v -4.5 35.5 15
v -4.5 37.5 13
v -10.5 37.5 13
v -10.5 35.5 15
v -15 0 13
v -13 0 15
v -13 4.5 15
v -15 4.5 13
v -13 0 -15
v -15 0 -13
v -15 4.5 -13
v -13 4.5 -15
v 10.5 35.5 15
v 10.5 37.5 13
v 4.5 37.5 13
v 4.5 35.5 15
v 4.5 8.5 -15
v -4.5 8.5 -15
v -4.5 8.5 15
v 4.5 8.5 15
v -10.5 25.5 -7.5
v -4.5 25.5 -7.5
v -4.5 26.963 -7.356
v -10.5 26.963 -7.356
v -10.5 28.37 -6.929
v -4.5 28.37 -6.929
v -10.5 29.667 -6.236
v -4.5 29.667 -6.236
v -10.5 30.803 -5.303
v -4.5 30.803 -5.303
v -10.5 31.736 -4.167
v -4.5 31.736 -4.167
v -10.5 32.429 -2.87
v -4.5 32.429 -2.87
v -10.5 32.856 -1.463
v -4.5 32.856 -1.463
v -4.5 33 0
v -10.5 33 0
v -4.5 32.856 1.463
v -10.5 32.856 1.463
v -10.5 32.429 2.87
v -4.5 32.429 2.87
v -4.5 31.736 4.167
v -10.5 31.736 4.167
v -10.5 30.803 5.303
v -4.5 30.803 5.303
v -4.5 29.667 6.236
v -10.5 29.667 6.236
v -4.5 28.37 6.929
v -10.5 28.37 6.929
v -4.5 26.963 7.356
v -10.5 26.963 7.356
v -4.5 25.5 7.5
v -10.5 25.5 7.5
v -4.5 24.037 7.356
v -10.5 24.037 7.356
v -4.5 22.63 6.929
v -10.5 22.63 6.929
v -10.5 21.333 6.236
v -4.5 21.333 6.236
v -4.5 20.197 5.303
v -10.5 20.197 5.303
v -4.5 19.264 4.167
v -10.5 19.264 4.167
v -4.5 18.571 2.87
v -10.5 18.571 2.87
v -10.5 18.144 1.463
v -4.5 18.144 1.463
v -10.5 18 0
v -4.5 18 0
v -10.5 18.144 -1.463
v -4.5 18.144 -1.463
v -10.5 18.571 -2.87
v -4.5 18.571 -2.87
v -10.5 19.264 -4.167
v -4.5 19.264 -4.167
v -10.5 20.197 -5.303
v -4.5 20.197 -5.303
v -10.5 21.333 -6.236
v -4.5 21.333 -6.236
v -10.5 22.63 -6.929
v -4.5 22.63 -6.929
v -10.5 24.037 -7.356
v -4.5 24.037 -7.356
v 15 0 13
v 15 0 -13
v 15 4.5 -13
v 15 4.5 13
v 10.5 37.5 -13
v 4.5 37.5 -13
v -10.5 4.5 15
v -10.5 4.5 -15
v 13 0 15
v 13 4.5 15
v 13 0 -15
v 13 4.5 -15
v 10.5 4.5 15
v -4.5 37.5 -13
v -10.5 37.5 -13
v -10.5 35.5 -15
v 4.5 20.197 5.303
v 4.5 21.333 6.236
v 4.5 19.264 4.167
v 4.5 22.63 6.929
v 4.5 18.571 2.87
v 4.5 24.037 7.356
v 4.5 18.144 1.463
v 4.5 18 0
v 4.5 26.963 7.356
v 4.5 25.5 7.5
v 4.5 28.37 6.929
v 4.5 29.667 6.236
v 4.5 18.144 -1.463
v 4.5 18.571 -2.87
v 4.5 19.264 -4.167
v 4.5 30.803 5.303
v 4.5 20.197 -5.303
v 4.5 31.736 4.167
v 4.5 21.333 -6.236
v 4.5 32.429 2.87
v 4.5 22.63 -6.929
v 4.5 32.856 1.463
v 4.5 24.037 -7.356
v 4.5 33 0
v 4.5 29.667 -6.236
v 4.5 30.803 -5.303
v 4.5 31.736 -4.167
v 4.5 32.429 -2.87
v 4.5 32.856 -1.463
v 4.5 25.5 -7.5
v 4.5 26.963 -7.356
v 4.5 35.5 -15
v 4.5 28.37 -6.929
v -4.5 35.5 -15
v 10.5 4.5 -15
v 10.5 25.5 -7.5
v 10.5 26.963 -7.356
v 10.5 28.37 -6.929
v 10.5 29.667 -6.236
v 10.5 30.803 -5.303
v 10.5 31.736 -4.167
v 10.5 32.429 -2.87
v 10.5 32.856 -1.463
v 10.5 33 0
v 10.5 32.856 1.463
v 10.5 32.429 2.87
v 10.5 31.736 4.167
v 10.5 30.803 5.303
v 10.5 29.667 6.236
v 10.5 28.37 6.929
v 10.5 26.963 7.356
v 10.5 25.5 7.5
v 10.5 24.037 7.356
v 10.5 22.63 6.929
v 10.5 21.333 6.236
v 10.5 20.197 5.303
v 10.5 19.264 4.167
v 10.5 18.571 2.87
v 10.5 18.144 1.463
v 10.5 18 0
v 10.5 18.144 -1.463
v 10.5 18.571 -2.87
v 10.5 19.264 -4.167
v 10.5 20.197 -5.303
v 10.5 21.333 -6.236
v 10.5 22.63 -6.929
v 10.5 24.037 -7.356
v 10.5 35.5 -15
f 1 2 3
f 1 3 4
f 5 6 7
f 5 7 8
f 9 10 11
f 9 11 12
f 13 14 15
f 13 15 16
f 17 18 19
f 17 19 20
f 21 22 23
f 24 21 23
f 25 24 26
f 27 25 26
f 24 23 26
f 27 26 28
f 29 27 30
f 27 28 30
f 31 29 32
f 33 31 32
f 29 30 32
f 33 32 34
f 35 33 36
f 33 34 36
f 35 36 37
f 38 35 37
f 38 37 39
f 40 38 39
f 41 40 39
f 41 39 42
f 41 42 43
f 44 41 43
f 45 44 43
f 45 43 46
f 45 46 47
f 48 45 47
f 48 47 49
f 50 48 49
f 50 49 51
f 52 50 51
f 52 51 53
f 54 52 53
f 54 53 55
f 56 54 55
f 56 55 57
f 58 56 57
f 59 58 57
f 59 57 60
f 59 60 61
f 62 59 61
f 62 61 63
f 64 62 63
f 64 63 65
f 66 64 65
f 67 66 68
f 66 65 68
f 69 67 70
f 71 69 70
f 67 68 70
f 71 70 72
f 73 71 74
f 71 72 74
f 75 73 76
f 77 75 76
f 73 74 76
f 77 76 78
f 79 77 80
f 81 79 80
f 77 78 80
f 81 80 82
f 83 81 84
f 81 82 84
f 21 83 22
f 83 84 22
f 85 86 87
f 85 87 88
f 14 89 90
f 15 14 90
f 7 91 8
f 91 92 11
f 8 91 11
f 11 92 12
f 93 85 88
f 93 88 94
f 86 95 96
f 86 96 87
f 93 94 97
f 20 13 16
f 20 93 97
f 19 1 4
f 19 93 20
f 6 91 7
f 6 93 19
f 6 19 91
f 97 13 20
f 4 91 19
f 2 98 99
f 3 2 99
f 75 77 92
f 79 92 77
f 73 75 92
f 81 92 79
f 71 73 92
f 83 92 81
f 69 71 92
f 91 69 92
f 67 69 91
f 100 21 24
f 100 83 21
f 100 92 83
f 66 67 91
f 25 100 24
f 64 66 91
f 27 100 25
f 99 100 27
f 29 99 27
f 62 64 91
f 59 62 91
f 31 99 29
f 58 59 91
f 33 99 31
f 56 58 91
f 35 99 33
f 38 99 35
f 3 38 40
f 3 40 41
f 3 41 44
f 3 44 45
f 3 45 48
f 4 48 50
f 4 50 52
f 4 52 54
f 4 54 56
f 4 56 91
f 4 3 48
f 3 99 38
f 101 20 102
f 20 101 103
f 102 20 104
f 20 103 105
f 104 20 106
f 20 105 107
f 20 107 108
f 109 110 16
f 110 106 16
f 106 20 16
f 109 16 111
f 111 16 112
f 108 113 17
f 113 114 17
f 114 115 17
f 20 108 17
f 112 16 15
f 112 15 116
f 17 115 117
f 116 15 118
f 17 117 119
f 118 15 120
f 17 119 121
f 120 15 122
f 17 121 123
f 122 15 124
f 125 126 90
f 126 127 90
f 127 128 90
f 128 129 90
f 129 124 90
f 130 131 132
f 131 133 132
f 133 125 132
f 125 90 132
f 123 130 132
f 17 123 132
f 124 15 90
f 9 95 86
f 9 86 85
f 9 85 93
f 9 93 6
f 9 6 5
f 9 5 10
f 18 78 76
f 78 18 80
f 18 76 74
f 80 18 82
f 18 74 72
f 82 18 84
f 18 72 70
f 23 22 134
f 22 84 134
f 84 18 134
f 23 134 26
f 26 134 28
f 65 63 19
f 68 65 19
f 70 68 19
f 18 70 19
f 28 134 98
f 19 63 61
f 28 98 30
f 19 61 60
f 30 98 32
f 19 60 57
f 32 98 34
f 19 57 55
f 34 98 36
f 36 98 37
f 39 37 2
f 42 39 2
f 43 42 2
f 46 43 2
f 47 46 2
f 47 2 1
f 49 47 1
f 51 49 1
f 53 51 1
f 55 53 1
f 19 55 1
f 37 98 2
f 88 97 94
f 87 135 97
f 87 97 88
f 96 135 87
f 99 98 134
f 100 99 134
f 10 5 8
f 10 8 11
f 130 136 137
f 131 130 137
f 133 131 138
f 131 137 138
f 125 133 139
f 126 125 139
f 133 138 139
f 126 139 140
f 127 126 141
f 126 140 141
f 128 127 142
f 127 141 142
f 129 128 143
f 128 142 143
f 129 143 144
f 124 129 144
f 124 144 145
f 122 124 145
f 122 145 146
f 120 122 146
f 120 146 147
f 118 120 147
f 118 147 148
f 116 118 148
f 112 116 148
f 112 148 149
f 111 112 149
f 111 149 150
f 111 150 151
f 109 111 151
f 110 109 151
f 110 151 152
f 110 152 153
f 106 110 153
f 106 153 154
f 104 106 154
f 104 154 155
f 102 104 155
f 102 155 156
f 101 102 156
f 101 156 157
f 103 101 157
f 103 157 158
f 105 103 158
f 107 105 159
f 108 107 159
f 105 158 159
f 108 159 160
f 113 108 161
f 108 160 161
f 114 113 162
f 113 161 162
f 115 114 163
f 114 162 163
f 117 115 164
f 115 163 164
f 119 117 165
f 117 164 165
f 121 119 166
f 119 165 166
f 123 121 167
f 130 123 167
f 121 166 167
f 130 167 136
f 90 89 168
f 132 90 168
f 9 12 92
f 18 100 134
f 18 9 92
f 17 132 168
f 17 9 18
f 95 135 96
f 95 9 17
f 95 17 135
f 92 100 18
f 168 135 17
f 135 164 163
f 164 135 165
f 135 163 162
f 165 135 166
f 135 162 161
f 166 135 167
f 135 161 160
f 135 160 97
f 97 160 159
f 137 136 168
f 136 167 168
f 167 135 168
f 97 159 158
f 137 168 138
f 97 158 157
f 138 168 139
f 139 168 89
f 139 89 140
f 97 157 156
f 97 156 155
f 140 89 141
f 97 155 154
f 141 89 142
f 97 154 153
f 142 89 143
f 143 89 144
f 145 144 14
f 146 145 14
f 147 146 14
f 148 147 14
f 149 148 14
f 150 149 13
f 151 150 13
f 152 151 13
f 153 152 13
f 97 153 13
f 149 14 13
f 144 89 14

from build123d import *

# Parameters (mm, degrees)
EXTRUDE_1_DEPTH     = 37.5
CUT_EXTRUDE_1_DEPTH = 33
CUT_EXTRUDE_2_DEPTH = 33
CUT_EXTRUDE_3_DEPTH = 29
SKETCH_12_R         = 7.5
CUT_EXTRUDE_5_DEPTH = 48.765049984
CUT_EXTRUDE_6_DEPTH = 48.765049984
CUT_EXTRUDE_7_DEPTH = 48.765049984


with BuildPart() as part:
    # 草图1 → 凸台-拉伸1 (new body)
    with BuildSketch(Plane(origin=(0, 0, 0), x_dir=(1, 0, 0), z_dir=(0, 1, 0))):
        Polygon((-15, 13), (-13, 15), (13, 15), (15, 13), (15, -13), (13, -15), (-13, -15), (-15, -13), align=None)
    extrude(amount=EXTRUDE_1_DEPTH)

    # 草图2 → 切除-拉伸1 (cut)
    with BuildSketch(Plane(origin=(0, 37.5, 0), x_dir=(1, 0, 0), z_dir=(0, 1, 0))):
        Polygon((-10.5, 15), (-10.5, -15), (-13, -15), (-15, -13), (-15, 13), (-13, 15), align=None)
    extrude(amount=-CUT_EXTRUDE_1_DEPTH, mode=Mode.SUBTRACT)

    # 草图5 → 切除-拉伸2 (cut)
    with BuildSketch(Plane(origin=(0, 37.5, 0), x_dir=(1, 0, 0), z_dir=(0, 1, 0))):
        Polygon((10.5, 15), (10.5, -15), (13, -15), (15, -13), (15, 13), (13, 15), align=None)
    extrude(amount=-CUT_EXTRUDE_2_DEPTH, mode=Mode.SUBTRACT)

    # 草图6 → 切除-拉伸3 (cut)
    with BuildSketch(Plane(origin=(0, 37.5, 0), x_dir=(1, 0, 0), z_dir=(0, 1, 0))):
        Polygon((4.5, 15), (0, 15), (-4.5, 15), (-4.5, -15), (4.5, -15), align=None)
    extrude(amount=-CUT_EXTRUDE_3_DEPTH, mode=Mode.SUBTRACT)

    # 草图12 → 切除-拉伸5 (cut, through all)
    with BuildSketch(Plane(origin=(10.5, 0, 0), x_dir=(0, 0, -1), z_dir=(1, 0, 0))):
        with Locations((0, 25.5)):
            Circle(SKETCH_12_R)
    extrude(amount=-CUT_EXTRUDE_5_DEPTH, mode=Mode.SUBTRACT)

    # 草图14 → 切除-拉伸6 (cut, through all)
    with BuildSketch(Plane(origin=(10.5, 0, 0), x_dir=(0, 0, -1), z_dir=(1, 0, 0))):
        Polygon((-15, 37.5), (-13, 37.5), (-15, 35.5), align=None)
    extrude(amount=-CUT_EXTRUDE_6_DEPTH, mode=Mode.SUBTRACT)

    # 草图15 → 切除-拉伸7 (cut, through all)
    with BuildSketch(Plane(origin=(10.5, 0, 0), x_dir=(0, 0, -1), z_dir=(1, 0, 0))):
        Polygon((15, 37.5), (13, 37.5), (15, 35.5), align=None)
    extrude(amount=-CUT_EXTRUDE_7_DEPTH, mode=Mode.SUBTRACT)


solid = part.part
